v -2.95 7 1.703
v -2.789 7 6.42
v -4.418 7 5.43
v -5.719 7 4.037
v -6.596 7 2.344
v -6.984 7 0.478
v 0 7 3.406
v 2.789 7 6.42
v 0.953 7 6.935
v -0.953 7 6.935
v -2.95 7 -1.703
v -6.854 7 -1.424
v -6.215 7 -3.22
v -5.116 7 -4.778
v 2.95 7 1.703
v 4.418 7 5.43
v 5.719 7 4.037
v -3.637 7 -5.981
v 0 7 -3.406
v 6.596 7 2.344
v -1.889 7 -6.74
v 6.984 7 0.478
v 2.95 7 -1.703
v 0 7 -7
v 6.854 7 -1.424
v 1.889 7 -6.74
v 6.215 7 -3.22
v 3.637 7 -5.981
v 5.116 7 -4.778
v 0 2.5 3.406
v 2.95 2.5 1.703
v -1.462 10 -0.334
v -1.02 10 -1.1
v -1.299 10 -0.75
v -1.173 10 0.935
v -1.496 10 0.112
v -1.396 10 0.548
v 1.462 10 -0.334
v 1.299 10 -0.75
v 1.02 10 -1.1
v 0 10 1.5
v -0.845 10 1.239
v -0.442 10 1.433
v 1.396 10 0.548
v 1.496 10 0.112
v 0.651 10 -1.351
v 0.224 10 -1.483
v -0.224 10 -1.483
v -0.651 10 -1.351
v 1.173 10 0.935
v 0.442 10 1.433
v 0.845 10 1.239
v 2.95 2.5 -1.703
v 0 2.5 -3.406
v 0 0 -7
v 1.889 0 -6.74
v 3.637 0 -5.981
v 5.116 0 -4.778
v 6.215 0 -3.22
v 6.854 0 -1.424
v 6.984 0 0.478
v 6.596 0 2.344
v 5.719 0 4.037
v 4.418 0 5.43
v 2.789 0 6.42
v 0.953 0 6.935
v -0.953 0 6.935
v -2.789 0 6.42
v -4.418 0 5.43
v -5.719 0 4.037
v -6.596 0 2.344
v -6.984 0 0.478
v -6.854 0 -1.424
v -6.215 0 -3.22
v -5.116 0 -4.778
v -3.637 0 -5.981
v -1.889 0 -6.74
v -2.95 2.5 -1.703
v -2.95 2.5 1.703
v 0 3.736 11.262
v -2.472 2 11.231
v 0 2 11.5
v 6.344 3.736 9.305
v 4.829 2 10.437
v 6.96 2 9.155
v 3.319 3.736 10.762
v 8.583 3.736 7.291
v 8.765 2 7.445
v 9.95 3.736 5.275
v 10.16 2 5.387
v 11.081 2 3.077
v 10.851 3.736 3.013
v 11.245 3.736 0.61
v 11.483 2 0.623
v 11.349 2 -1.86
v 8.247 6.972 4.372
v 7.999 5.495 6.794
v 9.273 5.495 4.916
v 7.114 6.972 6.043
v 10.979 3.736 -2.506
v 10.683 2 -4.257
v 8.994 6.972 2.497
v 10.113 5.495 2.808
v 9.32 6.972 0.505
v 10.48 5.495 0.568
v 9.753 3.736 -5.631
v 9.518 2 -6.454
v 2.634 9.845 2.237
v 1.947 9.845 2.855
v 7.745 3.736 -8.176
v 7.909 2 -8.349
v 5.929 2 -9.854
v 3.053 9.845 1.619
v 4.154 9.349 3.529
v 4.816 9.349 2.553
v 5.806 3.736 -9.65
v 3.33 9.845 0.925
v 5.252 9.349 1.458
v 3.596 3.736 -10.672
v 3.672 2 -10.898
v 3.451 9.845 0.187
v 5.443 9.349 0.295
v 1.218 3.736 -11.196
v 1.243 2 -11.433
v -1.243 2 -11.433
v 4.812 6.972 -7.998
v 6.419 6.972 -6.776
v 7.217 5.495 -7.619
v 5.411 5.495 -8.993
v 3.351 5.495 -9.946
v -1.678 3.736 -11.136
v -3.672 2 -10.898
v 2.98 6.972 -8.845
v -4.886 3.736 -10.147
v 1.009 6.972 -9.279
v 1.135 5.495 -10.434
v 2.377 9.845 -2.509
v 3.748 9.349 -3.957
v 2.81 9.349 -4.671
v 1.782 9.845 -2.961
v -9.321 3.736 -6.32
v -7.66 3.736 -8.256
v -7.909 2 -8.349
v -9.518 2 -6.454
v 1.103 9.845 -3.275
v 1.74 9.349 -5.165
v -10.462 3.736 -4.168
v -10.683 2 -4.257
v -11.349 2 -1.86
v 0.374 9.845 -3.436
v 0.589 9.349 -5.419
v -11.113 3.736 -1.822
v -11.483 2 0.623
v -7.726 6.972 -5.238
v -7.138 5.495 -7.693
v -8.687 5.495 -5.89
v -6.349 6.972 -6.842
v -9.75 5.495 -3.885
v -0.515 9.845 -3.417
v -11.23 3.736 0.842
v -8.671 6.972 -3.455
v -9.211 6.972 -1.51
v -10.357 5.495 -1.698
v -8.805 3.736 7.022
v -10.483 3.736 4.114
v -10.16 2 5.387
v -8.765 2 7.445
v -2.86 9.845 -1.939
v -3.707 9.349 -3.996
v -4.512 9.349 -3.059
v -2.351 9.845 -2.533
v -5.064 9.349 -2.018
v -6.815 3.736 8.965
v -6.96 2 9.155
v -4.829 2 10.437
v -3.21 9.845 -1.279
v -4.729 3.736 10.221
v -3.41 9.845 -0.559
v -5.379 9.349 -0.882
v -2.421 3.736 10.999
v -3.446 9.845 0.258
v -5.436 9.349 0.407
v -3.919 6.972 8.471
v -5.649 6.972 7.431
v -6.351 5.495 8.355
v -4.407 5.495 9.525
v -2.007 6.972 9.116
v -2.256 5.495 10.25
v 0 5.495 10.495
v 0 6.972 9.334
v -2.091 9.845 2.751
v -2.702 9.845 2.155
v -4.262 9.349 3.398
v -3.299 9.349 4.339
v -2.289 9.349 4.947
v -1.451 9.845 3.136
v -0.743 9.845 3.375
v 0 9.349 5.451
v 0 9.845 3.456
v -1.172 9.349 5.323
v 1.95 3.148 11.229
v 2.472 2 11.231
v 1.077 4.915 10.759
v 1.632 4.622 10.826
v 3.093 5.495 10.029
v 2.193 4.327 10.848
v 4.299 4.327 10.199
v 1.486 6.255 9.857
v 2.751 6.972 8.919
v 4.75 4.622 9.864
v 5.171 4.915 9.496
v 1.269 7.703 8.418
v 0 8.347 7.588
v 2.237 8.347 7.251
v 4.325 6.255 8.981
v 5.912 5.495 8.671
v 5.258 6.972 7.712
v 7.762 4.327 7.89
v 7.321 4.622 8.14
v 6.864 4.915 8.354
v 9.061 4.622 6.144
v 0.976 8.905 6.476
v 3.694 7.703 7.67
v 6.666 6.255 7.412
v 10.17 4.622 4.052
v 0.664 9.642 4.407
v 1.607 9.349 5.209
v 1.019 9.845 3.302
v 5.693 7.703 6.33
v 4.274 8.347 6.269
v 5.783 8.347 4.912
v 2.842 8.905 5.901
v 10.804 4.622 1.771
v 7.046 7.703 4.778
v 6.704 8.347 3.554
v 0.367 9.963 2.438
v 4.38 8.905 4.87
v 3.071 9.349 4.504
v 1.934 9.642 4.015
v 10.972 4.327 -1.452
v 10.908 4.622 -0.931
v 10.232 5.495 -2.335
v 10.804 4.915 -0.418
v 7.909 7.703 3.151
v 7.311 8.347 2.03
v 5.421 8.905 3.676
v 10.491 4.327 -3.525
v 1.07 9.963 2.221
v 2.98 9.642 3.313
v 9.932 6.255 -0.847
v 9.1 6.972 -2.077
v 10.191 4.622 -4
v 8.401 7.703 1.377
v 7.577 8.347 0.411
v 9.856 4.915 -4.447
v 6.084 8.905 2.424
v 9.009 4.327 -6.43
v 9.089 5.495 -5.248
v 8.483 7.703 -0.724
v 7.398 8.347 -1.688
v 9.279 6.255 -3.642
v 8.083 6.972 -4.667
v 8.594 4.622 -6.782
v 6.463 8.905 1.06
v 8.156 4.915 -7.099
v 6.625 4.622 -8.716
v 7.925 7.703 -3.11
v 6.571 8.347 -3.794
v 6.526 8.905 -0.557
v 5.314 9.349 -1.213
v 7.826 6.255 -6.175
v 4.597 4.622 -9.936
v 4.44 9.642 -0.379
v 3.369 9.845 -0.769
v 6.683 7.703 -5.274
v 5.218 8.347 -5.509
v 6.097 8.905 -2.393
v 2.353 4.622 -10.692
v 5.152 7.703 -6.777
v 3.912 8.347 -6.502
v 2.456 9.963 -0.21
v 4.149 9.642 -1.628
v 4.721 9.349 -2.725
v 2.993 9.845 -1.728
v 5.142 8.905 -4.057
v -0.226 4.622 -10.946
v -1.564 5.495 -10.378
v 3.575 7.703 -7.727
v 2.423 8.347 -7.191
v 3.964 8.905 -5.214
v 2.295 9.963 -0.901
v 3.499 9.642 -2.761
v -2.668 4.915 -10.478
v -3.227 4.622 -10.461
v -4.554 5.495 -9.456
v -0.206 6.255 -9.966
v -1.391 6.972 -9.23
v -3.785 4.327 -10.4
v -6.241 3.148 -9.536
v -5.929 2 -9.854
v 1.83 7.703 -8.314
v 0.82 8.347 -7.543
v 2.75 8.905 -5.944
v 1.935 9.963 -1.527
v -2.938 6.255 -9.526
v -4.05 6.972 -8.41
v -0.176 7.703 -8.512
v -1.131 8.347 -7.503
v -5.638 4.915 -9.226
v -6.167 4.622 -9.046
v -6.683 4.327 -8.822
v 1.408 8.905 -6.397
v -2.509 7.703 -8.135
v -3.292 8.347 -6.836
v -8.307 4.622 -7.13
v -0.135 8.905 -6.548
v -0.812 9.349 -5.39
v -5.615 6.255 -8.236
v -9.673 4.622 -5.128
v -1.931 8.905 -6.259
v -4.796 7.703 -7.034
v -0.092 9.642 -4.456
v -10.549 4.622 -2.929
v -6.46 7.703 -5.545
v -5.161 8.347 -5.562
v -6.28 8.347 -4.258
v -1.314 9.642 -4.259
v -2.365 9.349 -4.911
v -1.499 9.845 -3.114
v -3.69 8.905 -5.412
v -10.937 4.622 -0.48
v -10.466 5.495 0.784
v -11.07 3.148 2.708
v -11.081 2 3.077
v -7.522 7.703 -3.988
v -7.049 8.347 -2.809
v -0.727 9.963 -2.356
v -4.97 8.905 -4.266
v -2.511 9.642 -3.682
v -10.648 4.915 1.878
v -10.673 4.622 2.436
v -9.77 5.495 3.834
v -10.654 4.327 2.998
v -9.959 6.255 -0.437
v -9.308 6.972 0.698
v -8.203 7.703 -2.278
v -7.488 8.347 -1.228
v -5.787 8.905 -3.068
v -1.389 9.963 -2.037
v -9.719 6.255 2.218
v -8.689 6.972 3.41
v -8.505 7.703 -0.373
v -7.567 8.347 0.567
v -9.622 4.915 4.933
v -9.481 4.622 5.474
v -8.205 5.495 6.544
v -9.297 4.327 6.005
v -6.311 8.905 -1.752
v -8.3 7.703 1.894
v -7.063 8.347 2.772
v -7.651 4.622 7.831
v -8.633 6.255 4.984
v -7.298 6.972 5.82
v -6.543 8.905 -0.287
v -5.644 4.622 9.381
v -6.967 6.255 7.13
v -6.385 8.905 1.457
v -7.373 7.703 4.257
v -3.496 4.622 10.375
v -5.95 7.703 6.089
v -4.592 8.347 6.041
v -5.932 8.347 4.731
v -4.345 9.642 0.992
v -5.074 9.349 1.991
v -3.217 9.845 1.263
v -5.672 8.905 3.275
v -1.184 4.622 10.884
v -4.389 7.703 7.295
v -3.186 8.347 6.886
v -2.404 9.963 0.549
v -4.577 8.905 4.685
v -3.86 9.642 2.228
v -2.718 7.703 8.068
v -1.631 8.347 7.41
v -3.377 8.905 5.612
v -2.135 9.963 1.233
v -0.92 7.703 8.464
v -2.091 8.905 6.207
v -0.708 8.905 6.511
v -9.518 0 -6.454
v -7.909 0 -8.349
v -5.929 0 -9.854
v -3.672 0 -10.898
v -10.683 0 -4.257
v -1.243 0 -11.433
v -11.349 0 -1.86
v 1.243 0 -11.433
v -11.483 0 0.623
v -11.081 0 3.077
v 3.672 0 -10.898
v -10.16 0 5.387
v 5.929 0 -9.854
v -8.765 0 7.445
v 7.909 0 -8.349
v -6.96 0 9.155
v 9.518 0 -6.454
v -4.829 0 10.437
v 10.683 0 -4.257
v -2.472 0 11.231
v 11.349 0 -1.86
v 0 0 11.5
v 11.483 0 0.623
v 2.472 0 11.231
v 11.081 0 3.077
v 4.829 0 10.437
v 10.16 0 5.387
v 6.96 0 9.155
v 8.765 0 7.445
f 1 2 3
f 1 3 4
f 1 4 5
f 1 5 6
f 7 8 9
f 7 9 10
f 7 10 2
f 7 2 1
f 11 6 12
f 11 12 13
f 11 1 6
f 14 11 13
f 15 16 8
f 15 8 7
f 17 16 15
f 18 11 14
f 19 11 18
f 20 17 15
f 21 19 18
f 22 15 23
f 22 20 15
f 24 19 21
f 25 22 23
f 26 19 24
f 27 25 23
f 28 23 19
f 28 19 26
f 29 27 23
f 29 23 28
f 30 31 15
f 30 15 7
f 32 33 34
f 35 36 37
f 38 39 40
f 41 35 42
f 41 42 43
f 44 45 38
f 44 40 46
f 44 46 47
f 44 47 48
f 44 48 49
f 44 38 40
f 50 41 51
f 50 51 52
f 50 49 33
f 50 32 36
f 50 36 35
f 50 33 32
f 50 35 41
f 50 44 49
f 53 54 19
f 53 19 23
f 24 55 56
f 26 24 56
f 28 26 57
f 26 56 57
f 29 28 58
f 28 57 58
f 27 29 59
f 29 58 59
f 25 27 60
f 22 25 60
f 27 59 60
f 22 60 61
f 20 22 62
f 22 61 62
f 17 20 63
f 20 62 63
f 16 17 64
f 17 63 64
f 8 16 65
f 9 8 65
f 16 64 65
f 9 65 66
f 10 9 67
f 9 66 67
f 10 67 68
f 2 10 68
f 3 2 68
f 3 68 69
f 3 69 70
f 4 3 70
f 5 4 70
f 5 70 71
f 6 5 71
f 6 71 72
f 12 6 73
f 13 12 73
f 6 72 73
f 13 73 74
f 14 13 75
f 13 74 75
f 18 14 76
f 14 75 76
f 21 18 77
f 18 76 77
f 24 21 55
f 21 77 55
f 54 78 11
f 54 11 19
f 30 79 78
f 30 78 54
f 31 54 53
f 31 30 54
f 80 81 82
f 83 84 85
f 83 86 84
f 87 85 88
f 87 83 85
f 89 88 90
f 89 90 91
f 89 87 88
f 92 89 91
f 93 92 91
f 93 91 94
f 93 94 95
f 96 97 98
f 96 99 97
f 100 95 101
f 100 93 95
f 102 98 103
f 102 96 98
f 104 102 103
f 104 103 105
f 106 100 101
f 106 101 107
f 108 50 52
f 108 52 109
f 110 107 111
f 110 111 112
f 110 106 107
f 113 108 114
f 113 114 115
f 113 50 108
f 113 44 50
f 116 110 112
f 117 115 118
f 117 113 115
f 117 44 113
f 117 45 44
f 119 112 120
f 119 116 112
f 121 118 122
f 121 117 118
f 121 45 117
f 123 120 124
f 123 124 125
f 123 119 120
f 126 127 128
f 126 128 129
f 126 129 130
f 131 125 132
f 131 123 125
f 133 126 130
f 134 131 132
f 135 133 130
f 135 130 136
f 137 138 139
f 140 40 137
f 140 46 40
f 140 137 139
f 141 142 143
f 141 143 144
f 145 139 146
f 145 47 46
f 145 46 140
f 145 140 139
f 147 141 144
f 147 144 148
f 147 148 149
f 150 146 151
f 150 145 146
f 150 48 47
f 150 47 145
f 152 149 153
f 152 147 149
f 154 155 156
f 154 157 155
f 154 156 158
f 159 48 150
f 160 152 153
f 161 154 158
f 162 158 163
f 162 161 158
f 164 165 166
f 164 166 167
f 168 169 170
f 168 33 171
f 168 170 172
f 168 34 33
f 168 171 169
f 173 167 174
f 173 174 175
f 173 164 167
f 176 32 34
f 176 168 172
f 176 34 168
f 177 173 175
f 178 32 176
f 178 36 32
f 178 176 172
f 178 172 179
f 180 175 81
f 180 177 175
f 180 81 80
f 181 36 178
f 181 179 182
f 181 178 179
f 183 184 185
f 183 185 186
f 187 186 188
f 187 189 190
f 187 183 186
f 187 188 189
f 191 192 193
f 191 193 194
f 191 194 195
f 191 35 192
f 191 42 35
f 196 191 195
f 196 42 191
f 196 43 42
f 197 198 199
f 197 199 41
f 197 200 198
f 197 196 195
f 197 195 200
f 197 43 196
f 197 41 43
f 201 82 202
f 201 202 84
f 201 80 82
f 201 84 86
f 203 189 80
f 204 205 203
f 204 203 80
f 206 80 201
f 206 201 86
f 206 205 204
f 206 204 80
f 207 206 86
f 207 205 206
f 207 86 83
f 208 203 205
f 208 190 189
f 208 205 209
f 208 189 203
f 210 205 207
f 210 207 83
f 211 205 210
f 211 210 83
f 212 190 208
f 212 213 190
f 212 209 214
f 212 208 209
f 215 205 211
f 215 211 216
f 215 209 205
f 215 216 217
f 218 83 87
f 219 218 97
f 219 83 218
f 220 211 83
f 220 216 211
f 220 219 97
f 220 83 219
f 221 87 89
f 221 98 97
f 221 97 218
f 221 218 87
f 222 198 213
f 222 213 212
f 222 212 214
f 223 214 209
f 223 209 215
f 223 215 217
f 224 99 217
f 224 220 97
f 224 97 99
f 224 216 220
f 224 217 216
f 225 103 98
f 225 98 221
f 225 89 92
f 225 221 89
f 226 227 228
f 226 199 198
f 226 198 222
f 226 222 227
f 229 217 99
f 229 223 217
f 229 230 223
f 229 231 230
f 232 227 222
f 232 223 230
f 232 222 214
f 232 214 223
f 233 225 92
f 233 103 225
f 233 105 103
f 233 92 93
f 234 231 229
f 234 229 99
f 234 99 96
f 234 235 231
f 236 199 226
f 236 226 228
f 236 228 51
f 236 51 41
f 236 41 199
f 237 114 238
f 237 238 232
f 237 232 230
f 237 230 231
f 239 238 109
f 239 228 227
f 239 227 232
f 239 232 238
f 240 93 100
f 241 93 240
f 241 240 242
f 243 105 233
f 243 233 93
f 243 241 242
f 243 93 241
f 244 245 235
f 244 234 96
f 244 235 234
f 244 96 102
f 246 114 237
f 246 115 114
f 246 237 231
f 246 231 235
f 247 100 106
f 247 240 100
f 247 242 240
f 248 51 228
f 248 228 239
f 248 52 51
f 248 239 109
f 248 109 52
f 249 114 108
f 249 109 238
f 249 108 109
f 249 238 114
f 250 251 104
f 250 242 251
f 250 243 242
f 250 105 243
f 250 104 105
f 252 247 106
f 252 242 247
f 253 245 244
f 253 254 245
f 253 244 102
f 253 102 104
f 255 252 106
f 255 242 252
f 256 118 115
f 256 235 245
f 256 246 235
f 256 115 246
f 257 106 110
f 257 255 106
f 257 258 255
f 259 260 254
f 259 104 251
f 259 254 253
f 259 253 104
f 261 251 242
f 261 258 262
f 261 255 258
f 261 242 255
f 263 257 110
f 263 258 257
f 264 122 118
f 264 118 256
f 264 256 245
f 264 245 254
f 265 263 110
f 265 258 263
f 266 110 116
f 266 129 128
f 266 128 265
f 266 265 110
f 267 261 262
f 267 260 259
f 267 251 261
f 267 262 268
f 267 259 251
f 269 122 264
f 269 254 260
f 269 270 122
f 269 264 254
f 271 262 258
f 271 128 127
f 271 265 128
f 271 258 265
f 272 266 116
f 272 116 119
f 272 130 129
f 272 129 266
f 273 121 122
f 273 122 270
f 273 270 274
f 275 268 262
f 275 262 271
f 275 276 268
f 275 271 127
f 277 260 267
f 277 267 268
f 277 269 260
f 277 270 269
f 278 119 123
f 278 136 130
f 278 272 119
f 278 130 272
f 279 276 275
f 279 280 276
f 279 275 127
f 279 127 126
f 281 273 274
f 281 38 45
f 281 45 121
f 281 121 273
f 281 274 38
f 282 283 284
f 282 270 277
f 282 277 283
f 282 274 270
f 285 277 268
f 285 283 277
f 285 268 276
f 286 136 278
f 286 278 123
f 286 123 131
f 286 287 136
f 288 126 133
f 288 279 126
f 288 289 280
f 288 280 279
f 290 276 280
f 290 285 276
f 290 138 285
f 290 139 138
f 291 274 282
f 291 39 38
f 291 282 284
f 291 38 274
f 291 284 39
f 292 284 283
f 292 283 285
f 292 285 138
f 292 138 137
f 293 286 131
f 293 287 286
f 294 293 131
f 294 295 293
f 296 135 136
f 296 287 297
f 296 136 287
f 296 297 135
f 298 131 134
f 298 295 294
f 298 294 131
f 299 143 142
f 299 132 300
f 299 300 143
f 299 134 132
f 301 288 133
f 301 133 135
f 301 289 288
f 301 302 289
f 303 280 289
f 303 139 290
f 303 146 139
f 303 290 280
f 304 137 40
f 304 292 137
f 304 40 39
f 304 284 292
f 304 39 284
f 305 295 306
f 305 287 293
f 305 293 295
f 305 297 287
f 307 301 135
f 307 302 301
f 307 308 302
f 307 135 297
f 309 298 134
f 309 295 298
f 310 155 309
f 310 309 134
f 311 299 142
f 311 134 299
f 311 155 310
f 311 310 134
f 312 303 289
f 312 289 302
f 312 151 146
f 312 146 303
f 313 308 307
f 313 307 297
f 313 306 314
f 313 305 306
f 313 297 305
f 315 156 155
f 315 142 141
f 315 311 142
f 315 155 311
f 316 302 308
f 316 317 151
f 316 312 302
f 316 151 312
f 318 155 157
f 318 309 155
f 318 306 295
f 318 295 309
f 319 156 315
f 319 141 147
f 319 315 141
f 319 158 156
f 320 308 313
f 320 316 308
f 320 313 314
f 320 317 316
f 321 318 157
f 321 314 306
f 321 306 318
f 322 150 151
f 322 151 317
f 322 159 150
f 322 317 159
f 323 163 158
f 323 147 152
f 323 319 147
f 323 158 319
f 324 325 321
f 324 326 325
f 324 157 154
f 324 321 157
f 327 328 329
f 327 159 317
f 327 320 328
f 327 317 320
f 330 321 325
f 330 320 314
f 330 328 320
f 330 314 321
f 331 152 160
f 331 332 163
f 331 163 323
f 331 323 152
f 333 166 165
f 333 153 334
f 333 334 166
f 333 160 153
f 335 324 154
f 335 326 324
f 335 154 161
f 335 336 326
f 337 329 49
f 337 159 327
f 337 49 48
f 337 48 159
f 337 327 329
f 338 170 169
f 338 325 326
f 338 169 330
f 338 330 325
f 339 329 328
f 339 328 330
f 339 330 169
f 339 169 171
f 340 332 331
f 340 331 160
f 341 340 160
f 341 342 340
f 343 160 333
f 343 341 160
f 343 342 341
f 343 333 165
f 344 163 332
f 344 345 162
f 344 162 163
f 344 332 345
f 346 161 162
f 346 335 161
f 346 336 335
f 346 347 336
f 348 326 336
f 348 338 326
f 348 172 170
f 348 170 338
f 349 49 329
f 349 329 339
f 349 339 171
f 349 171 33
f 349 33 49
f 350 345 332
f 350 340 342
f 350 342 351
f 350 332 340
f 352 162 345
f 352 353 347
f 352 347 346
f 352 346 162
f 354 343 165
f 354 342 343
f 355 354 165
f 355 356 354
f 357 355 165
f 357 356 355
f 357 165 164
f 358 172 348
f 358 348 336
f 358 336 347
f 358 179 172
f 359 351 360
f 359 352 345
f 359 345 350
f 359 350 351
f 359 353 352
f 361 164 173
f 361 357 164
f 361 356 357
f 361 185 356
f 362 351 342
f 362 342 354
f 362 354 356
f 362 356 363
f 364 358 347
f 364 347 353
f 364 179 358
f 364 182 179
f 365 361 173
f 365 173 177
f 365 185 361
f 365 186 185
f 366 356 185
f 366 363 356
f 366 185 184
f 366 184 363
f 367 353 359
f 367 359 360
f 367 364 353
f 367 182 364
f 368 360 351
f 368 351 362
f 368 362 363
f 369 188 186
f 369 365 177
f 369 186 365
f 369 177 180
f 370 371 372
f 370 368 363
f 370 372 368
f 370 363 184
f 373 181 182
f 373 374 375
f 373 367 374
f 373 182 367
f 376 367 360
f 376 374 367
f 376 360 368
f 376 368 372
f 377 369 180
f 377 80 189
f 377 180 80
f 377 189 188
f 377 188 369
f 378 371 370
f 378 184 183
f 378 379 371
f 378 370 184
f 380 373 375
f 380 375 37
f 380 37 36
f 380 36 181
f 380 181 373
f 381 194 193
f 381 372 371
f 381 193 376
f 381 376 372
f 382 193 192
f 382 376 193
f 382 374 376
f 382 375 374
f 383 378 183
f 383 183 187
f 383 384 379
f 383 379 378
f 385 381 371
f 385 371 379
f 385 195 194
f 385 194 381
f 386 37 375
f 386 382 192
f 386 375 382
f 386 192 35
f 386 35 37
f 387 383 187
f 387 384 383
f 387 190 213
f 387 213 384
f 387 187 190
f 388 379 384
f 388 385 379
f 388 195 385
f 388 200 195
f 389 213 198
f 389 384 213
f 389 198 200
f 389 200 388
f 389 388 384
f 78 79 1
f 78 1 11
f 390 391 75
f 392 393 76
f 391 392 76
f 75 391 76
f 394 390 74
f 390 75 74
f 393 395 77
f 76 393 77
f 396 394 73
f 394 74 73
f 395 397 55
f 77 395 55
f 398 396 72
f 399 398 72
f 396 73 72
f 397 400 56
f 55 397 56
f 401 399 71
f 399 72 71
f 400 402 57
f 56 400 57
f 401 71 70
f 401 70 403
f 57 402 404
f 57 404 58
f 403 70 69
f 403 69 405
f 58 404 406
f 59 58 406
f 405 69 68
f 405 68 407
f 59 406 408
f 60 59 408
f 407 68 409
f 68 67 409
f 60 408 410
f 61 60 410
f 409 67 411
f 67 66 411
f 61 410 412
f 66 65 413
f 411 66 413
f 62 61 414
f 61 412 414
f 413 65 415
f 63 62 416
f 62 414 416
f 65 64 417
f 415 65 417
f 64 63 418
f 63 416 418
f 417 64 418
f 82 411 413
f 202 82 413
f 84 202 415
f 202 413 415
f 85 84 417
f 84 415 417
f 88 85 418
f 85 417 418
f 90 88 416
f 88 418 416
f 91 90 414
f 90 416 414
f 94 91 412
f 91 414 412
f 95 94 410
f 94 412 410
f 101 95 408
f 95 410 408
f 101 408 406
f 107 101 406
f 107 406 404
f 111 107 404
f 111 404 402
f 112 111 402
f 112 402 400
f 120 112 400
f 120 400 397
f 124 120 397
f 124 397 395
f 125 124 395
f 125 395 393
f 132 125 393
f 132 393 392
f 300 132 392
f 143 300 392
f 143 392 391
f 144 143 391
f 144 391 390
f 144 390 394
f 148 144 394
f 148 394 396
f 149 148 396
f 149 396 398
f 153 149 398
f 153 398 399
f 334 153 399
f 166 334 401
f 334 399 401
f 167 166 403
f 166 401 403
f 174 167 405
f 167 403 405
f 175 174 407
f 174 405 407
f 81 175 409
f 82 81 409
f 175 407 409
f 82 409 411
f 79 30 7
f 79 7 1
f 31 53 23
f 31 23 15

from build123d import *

# Parameters (mm, degrees)
SKETCH1_R           = 11.5
BOSS_EXTRUDE1_DEPTH = 10
FILLET1_SIZE        = 8
FILLET1_SIZE_2      = 10
SKETCH2_R           = 7
CUT_EXTRUDE1_DEPTH  = 7
SKETCH3_R           = 4.558249482
CUT_EXTRUDE2_DEPTH  = 2.5


with BuildPart() as part:
    # Sketch1 → Boss-Extrude1 (new body)
    with BuildSketch(Plane(origin=(0, 0, 0), x_dir=(1, 0, 0), z_dir=(0, 1, 0))):
        with Locations(Location((0, 0, 0), (0, 0, 270))):
            Circle(SKETCH1_R)
    extrude(amount=BOSS_EXTRUDE1_DEPTH)

    # Fillet1
    # an asymmetric fillet: 10, 8 mm, written as the material it takes off along each edge
    with BuildSketch(Plane(origin=(0, 10, 0), x_dir=(0, 0, 1), z_dir=(-1, 0, 0))) as fillet1_piece_1:
        with BuildLine():
            Bezier((11.5, -FILLET1_SIZE), (11.5, 0), (11.5 - FILLET1_SIZE_2, 0), weights=[1, 0.707106781, 1])
            Line((11.5 - FILLET1_SIZE_2, 0), (11.5, 0))
            Line((11.5, 0), (11.5, -FILLET1_SIZE))
        make_face()
    revolve(axis=Axis((0, 10, 0), (0, 1, 0)), mode=Mode.SUBTRACT)

    # Sketch2 → Cut-Extrude1 (cut)
    with BuildSketch(Plane.XZ):
        with Locations(Location((0, 0, 0), (0, 0, 270))):
            Circle(SKETCH2_R)
        Polygon((2.95, -1.703183294), (2.95, 1.703183294), (0, 3.406366588), (-2.95, 1.703183294), (-2.95, -1.703183294), (0, -3.406366588), align=None, mode=Mode.SUBTRACT)
    extrude(amount=-CUT_EXTRUDE1_DEPTH, mode=Mode.SUBTRACT)

    # Sketch3 → Cut-Extrude2 (cut)
    with BuildSketch(Plane.XZ):
        Circle(SKETCH3_R)
    extrude(amount=-CUT_EXTRUDE2_DEPTH, mode=Mode.SUBTRACT)


solid = part.part
